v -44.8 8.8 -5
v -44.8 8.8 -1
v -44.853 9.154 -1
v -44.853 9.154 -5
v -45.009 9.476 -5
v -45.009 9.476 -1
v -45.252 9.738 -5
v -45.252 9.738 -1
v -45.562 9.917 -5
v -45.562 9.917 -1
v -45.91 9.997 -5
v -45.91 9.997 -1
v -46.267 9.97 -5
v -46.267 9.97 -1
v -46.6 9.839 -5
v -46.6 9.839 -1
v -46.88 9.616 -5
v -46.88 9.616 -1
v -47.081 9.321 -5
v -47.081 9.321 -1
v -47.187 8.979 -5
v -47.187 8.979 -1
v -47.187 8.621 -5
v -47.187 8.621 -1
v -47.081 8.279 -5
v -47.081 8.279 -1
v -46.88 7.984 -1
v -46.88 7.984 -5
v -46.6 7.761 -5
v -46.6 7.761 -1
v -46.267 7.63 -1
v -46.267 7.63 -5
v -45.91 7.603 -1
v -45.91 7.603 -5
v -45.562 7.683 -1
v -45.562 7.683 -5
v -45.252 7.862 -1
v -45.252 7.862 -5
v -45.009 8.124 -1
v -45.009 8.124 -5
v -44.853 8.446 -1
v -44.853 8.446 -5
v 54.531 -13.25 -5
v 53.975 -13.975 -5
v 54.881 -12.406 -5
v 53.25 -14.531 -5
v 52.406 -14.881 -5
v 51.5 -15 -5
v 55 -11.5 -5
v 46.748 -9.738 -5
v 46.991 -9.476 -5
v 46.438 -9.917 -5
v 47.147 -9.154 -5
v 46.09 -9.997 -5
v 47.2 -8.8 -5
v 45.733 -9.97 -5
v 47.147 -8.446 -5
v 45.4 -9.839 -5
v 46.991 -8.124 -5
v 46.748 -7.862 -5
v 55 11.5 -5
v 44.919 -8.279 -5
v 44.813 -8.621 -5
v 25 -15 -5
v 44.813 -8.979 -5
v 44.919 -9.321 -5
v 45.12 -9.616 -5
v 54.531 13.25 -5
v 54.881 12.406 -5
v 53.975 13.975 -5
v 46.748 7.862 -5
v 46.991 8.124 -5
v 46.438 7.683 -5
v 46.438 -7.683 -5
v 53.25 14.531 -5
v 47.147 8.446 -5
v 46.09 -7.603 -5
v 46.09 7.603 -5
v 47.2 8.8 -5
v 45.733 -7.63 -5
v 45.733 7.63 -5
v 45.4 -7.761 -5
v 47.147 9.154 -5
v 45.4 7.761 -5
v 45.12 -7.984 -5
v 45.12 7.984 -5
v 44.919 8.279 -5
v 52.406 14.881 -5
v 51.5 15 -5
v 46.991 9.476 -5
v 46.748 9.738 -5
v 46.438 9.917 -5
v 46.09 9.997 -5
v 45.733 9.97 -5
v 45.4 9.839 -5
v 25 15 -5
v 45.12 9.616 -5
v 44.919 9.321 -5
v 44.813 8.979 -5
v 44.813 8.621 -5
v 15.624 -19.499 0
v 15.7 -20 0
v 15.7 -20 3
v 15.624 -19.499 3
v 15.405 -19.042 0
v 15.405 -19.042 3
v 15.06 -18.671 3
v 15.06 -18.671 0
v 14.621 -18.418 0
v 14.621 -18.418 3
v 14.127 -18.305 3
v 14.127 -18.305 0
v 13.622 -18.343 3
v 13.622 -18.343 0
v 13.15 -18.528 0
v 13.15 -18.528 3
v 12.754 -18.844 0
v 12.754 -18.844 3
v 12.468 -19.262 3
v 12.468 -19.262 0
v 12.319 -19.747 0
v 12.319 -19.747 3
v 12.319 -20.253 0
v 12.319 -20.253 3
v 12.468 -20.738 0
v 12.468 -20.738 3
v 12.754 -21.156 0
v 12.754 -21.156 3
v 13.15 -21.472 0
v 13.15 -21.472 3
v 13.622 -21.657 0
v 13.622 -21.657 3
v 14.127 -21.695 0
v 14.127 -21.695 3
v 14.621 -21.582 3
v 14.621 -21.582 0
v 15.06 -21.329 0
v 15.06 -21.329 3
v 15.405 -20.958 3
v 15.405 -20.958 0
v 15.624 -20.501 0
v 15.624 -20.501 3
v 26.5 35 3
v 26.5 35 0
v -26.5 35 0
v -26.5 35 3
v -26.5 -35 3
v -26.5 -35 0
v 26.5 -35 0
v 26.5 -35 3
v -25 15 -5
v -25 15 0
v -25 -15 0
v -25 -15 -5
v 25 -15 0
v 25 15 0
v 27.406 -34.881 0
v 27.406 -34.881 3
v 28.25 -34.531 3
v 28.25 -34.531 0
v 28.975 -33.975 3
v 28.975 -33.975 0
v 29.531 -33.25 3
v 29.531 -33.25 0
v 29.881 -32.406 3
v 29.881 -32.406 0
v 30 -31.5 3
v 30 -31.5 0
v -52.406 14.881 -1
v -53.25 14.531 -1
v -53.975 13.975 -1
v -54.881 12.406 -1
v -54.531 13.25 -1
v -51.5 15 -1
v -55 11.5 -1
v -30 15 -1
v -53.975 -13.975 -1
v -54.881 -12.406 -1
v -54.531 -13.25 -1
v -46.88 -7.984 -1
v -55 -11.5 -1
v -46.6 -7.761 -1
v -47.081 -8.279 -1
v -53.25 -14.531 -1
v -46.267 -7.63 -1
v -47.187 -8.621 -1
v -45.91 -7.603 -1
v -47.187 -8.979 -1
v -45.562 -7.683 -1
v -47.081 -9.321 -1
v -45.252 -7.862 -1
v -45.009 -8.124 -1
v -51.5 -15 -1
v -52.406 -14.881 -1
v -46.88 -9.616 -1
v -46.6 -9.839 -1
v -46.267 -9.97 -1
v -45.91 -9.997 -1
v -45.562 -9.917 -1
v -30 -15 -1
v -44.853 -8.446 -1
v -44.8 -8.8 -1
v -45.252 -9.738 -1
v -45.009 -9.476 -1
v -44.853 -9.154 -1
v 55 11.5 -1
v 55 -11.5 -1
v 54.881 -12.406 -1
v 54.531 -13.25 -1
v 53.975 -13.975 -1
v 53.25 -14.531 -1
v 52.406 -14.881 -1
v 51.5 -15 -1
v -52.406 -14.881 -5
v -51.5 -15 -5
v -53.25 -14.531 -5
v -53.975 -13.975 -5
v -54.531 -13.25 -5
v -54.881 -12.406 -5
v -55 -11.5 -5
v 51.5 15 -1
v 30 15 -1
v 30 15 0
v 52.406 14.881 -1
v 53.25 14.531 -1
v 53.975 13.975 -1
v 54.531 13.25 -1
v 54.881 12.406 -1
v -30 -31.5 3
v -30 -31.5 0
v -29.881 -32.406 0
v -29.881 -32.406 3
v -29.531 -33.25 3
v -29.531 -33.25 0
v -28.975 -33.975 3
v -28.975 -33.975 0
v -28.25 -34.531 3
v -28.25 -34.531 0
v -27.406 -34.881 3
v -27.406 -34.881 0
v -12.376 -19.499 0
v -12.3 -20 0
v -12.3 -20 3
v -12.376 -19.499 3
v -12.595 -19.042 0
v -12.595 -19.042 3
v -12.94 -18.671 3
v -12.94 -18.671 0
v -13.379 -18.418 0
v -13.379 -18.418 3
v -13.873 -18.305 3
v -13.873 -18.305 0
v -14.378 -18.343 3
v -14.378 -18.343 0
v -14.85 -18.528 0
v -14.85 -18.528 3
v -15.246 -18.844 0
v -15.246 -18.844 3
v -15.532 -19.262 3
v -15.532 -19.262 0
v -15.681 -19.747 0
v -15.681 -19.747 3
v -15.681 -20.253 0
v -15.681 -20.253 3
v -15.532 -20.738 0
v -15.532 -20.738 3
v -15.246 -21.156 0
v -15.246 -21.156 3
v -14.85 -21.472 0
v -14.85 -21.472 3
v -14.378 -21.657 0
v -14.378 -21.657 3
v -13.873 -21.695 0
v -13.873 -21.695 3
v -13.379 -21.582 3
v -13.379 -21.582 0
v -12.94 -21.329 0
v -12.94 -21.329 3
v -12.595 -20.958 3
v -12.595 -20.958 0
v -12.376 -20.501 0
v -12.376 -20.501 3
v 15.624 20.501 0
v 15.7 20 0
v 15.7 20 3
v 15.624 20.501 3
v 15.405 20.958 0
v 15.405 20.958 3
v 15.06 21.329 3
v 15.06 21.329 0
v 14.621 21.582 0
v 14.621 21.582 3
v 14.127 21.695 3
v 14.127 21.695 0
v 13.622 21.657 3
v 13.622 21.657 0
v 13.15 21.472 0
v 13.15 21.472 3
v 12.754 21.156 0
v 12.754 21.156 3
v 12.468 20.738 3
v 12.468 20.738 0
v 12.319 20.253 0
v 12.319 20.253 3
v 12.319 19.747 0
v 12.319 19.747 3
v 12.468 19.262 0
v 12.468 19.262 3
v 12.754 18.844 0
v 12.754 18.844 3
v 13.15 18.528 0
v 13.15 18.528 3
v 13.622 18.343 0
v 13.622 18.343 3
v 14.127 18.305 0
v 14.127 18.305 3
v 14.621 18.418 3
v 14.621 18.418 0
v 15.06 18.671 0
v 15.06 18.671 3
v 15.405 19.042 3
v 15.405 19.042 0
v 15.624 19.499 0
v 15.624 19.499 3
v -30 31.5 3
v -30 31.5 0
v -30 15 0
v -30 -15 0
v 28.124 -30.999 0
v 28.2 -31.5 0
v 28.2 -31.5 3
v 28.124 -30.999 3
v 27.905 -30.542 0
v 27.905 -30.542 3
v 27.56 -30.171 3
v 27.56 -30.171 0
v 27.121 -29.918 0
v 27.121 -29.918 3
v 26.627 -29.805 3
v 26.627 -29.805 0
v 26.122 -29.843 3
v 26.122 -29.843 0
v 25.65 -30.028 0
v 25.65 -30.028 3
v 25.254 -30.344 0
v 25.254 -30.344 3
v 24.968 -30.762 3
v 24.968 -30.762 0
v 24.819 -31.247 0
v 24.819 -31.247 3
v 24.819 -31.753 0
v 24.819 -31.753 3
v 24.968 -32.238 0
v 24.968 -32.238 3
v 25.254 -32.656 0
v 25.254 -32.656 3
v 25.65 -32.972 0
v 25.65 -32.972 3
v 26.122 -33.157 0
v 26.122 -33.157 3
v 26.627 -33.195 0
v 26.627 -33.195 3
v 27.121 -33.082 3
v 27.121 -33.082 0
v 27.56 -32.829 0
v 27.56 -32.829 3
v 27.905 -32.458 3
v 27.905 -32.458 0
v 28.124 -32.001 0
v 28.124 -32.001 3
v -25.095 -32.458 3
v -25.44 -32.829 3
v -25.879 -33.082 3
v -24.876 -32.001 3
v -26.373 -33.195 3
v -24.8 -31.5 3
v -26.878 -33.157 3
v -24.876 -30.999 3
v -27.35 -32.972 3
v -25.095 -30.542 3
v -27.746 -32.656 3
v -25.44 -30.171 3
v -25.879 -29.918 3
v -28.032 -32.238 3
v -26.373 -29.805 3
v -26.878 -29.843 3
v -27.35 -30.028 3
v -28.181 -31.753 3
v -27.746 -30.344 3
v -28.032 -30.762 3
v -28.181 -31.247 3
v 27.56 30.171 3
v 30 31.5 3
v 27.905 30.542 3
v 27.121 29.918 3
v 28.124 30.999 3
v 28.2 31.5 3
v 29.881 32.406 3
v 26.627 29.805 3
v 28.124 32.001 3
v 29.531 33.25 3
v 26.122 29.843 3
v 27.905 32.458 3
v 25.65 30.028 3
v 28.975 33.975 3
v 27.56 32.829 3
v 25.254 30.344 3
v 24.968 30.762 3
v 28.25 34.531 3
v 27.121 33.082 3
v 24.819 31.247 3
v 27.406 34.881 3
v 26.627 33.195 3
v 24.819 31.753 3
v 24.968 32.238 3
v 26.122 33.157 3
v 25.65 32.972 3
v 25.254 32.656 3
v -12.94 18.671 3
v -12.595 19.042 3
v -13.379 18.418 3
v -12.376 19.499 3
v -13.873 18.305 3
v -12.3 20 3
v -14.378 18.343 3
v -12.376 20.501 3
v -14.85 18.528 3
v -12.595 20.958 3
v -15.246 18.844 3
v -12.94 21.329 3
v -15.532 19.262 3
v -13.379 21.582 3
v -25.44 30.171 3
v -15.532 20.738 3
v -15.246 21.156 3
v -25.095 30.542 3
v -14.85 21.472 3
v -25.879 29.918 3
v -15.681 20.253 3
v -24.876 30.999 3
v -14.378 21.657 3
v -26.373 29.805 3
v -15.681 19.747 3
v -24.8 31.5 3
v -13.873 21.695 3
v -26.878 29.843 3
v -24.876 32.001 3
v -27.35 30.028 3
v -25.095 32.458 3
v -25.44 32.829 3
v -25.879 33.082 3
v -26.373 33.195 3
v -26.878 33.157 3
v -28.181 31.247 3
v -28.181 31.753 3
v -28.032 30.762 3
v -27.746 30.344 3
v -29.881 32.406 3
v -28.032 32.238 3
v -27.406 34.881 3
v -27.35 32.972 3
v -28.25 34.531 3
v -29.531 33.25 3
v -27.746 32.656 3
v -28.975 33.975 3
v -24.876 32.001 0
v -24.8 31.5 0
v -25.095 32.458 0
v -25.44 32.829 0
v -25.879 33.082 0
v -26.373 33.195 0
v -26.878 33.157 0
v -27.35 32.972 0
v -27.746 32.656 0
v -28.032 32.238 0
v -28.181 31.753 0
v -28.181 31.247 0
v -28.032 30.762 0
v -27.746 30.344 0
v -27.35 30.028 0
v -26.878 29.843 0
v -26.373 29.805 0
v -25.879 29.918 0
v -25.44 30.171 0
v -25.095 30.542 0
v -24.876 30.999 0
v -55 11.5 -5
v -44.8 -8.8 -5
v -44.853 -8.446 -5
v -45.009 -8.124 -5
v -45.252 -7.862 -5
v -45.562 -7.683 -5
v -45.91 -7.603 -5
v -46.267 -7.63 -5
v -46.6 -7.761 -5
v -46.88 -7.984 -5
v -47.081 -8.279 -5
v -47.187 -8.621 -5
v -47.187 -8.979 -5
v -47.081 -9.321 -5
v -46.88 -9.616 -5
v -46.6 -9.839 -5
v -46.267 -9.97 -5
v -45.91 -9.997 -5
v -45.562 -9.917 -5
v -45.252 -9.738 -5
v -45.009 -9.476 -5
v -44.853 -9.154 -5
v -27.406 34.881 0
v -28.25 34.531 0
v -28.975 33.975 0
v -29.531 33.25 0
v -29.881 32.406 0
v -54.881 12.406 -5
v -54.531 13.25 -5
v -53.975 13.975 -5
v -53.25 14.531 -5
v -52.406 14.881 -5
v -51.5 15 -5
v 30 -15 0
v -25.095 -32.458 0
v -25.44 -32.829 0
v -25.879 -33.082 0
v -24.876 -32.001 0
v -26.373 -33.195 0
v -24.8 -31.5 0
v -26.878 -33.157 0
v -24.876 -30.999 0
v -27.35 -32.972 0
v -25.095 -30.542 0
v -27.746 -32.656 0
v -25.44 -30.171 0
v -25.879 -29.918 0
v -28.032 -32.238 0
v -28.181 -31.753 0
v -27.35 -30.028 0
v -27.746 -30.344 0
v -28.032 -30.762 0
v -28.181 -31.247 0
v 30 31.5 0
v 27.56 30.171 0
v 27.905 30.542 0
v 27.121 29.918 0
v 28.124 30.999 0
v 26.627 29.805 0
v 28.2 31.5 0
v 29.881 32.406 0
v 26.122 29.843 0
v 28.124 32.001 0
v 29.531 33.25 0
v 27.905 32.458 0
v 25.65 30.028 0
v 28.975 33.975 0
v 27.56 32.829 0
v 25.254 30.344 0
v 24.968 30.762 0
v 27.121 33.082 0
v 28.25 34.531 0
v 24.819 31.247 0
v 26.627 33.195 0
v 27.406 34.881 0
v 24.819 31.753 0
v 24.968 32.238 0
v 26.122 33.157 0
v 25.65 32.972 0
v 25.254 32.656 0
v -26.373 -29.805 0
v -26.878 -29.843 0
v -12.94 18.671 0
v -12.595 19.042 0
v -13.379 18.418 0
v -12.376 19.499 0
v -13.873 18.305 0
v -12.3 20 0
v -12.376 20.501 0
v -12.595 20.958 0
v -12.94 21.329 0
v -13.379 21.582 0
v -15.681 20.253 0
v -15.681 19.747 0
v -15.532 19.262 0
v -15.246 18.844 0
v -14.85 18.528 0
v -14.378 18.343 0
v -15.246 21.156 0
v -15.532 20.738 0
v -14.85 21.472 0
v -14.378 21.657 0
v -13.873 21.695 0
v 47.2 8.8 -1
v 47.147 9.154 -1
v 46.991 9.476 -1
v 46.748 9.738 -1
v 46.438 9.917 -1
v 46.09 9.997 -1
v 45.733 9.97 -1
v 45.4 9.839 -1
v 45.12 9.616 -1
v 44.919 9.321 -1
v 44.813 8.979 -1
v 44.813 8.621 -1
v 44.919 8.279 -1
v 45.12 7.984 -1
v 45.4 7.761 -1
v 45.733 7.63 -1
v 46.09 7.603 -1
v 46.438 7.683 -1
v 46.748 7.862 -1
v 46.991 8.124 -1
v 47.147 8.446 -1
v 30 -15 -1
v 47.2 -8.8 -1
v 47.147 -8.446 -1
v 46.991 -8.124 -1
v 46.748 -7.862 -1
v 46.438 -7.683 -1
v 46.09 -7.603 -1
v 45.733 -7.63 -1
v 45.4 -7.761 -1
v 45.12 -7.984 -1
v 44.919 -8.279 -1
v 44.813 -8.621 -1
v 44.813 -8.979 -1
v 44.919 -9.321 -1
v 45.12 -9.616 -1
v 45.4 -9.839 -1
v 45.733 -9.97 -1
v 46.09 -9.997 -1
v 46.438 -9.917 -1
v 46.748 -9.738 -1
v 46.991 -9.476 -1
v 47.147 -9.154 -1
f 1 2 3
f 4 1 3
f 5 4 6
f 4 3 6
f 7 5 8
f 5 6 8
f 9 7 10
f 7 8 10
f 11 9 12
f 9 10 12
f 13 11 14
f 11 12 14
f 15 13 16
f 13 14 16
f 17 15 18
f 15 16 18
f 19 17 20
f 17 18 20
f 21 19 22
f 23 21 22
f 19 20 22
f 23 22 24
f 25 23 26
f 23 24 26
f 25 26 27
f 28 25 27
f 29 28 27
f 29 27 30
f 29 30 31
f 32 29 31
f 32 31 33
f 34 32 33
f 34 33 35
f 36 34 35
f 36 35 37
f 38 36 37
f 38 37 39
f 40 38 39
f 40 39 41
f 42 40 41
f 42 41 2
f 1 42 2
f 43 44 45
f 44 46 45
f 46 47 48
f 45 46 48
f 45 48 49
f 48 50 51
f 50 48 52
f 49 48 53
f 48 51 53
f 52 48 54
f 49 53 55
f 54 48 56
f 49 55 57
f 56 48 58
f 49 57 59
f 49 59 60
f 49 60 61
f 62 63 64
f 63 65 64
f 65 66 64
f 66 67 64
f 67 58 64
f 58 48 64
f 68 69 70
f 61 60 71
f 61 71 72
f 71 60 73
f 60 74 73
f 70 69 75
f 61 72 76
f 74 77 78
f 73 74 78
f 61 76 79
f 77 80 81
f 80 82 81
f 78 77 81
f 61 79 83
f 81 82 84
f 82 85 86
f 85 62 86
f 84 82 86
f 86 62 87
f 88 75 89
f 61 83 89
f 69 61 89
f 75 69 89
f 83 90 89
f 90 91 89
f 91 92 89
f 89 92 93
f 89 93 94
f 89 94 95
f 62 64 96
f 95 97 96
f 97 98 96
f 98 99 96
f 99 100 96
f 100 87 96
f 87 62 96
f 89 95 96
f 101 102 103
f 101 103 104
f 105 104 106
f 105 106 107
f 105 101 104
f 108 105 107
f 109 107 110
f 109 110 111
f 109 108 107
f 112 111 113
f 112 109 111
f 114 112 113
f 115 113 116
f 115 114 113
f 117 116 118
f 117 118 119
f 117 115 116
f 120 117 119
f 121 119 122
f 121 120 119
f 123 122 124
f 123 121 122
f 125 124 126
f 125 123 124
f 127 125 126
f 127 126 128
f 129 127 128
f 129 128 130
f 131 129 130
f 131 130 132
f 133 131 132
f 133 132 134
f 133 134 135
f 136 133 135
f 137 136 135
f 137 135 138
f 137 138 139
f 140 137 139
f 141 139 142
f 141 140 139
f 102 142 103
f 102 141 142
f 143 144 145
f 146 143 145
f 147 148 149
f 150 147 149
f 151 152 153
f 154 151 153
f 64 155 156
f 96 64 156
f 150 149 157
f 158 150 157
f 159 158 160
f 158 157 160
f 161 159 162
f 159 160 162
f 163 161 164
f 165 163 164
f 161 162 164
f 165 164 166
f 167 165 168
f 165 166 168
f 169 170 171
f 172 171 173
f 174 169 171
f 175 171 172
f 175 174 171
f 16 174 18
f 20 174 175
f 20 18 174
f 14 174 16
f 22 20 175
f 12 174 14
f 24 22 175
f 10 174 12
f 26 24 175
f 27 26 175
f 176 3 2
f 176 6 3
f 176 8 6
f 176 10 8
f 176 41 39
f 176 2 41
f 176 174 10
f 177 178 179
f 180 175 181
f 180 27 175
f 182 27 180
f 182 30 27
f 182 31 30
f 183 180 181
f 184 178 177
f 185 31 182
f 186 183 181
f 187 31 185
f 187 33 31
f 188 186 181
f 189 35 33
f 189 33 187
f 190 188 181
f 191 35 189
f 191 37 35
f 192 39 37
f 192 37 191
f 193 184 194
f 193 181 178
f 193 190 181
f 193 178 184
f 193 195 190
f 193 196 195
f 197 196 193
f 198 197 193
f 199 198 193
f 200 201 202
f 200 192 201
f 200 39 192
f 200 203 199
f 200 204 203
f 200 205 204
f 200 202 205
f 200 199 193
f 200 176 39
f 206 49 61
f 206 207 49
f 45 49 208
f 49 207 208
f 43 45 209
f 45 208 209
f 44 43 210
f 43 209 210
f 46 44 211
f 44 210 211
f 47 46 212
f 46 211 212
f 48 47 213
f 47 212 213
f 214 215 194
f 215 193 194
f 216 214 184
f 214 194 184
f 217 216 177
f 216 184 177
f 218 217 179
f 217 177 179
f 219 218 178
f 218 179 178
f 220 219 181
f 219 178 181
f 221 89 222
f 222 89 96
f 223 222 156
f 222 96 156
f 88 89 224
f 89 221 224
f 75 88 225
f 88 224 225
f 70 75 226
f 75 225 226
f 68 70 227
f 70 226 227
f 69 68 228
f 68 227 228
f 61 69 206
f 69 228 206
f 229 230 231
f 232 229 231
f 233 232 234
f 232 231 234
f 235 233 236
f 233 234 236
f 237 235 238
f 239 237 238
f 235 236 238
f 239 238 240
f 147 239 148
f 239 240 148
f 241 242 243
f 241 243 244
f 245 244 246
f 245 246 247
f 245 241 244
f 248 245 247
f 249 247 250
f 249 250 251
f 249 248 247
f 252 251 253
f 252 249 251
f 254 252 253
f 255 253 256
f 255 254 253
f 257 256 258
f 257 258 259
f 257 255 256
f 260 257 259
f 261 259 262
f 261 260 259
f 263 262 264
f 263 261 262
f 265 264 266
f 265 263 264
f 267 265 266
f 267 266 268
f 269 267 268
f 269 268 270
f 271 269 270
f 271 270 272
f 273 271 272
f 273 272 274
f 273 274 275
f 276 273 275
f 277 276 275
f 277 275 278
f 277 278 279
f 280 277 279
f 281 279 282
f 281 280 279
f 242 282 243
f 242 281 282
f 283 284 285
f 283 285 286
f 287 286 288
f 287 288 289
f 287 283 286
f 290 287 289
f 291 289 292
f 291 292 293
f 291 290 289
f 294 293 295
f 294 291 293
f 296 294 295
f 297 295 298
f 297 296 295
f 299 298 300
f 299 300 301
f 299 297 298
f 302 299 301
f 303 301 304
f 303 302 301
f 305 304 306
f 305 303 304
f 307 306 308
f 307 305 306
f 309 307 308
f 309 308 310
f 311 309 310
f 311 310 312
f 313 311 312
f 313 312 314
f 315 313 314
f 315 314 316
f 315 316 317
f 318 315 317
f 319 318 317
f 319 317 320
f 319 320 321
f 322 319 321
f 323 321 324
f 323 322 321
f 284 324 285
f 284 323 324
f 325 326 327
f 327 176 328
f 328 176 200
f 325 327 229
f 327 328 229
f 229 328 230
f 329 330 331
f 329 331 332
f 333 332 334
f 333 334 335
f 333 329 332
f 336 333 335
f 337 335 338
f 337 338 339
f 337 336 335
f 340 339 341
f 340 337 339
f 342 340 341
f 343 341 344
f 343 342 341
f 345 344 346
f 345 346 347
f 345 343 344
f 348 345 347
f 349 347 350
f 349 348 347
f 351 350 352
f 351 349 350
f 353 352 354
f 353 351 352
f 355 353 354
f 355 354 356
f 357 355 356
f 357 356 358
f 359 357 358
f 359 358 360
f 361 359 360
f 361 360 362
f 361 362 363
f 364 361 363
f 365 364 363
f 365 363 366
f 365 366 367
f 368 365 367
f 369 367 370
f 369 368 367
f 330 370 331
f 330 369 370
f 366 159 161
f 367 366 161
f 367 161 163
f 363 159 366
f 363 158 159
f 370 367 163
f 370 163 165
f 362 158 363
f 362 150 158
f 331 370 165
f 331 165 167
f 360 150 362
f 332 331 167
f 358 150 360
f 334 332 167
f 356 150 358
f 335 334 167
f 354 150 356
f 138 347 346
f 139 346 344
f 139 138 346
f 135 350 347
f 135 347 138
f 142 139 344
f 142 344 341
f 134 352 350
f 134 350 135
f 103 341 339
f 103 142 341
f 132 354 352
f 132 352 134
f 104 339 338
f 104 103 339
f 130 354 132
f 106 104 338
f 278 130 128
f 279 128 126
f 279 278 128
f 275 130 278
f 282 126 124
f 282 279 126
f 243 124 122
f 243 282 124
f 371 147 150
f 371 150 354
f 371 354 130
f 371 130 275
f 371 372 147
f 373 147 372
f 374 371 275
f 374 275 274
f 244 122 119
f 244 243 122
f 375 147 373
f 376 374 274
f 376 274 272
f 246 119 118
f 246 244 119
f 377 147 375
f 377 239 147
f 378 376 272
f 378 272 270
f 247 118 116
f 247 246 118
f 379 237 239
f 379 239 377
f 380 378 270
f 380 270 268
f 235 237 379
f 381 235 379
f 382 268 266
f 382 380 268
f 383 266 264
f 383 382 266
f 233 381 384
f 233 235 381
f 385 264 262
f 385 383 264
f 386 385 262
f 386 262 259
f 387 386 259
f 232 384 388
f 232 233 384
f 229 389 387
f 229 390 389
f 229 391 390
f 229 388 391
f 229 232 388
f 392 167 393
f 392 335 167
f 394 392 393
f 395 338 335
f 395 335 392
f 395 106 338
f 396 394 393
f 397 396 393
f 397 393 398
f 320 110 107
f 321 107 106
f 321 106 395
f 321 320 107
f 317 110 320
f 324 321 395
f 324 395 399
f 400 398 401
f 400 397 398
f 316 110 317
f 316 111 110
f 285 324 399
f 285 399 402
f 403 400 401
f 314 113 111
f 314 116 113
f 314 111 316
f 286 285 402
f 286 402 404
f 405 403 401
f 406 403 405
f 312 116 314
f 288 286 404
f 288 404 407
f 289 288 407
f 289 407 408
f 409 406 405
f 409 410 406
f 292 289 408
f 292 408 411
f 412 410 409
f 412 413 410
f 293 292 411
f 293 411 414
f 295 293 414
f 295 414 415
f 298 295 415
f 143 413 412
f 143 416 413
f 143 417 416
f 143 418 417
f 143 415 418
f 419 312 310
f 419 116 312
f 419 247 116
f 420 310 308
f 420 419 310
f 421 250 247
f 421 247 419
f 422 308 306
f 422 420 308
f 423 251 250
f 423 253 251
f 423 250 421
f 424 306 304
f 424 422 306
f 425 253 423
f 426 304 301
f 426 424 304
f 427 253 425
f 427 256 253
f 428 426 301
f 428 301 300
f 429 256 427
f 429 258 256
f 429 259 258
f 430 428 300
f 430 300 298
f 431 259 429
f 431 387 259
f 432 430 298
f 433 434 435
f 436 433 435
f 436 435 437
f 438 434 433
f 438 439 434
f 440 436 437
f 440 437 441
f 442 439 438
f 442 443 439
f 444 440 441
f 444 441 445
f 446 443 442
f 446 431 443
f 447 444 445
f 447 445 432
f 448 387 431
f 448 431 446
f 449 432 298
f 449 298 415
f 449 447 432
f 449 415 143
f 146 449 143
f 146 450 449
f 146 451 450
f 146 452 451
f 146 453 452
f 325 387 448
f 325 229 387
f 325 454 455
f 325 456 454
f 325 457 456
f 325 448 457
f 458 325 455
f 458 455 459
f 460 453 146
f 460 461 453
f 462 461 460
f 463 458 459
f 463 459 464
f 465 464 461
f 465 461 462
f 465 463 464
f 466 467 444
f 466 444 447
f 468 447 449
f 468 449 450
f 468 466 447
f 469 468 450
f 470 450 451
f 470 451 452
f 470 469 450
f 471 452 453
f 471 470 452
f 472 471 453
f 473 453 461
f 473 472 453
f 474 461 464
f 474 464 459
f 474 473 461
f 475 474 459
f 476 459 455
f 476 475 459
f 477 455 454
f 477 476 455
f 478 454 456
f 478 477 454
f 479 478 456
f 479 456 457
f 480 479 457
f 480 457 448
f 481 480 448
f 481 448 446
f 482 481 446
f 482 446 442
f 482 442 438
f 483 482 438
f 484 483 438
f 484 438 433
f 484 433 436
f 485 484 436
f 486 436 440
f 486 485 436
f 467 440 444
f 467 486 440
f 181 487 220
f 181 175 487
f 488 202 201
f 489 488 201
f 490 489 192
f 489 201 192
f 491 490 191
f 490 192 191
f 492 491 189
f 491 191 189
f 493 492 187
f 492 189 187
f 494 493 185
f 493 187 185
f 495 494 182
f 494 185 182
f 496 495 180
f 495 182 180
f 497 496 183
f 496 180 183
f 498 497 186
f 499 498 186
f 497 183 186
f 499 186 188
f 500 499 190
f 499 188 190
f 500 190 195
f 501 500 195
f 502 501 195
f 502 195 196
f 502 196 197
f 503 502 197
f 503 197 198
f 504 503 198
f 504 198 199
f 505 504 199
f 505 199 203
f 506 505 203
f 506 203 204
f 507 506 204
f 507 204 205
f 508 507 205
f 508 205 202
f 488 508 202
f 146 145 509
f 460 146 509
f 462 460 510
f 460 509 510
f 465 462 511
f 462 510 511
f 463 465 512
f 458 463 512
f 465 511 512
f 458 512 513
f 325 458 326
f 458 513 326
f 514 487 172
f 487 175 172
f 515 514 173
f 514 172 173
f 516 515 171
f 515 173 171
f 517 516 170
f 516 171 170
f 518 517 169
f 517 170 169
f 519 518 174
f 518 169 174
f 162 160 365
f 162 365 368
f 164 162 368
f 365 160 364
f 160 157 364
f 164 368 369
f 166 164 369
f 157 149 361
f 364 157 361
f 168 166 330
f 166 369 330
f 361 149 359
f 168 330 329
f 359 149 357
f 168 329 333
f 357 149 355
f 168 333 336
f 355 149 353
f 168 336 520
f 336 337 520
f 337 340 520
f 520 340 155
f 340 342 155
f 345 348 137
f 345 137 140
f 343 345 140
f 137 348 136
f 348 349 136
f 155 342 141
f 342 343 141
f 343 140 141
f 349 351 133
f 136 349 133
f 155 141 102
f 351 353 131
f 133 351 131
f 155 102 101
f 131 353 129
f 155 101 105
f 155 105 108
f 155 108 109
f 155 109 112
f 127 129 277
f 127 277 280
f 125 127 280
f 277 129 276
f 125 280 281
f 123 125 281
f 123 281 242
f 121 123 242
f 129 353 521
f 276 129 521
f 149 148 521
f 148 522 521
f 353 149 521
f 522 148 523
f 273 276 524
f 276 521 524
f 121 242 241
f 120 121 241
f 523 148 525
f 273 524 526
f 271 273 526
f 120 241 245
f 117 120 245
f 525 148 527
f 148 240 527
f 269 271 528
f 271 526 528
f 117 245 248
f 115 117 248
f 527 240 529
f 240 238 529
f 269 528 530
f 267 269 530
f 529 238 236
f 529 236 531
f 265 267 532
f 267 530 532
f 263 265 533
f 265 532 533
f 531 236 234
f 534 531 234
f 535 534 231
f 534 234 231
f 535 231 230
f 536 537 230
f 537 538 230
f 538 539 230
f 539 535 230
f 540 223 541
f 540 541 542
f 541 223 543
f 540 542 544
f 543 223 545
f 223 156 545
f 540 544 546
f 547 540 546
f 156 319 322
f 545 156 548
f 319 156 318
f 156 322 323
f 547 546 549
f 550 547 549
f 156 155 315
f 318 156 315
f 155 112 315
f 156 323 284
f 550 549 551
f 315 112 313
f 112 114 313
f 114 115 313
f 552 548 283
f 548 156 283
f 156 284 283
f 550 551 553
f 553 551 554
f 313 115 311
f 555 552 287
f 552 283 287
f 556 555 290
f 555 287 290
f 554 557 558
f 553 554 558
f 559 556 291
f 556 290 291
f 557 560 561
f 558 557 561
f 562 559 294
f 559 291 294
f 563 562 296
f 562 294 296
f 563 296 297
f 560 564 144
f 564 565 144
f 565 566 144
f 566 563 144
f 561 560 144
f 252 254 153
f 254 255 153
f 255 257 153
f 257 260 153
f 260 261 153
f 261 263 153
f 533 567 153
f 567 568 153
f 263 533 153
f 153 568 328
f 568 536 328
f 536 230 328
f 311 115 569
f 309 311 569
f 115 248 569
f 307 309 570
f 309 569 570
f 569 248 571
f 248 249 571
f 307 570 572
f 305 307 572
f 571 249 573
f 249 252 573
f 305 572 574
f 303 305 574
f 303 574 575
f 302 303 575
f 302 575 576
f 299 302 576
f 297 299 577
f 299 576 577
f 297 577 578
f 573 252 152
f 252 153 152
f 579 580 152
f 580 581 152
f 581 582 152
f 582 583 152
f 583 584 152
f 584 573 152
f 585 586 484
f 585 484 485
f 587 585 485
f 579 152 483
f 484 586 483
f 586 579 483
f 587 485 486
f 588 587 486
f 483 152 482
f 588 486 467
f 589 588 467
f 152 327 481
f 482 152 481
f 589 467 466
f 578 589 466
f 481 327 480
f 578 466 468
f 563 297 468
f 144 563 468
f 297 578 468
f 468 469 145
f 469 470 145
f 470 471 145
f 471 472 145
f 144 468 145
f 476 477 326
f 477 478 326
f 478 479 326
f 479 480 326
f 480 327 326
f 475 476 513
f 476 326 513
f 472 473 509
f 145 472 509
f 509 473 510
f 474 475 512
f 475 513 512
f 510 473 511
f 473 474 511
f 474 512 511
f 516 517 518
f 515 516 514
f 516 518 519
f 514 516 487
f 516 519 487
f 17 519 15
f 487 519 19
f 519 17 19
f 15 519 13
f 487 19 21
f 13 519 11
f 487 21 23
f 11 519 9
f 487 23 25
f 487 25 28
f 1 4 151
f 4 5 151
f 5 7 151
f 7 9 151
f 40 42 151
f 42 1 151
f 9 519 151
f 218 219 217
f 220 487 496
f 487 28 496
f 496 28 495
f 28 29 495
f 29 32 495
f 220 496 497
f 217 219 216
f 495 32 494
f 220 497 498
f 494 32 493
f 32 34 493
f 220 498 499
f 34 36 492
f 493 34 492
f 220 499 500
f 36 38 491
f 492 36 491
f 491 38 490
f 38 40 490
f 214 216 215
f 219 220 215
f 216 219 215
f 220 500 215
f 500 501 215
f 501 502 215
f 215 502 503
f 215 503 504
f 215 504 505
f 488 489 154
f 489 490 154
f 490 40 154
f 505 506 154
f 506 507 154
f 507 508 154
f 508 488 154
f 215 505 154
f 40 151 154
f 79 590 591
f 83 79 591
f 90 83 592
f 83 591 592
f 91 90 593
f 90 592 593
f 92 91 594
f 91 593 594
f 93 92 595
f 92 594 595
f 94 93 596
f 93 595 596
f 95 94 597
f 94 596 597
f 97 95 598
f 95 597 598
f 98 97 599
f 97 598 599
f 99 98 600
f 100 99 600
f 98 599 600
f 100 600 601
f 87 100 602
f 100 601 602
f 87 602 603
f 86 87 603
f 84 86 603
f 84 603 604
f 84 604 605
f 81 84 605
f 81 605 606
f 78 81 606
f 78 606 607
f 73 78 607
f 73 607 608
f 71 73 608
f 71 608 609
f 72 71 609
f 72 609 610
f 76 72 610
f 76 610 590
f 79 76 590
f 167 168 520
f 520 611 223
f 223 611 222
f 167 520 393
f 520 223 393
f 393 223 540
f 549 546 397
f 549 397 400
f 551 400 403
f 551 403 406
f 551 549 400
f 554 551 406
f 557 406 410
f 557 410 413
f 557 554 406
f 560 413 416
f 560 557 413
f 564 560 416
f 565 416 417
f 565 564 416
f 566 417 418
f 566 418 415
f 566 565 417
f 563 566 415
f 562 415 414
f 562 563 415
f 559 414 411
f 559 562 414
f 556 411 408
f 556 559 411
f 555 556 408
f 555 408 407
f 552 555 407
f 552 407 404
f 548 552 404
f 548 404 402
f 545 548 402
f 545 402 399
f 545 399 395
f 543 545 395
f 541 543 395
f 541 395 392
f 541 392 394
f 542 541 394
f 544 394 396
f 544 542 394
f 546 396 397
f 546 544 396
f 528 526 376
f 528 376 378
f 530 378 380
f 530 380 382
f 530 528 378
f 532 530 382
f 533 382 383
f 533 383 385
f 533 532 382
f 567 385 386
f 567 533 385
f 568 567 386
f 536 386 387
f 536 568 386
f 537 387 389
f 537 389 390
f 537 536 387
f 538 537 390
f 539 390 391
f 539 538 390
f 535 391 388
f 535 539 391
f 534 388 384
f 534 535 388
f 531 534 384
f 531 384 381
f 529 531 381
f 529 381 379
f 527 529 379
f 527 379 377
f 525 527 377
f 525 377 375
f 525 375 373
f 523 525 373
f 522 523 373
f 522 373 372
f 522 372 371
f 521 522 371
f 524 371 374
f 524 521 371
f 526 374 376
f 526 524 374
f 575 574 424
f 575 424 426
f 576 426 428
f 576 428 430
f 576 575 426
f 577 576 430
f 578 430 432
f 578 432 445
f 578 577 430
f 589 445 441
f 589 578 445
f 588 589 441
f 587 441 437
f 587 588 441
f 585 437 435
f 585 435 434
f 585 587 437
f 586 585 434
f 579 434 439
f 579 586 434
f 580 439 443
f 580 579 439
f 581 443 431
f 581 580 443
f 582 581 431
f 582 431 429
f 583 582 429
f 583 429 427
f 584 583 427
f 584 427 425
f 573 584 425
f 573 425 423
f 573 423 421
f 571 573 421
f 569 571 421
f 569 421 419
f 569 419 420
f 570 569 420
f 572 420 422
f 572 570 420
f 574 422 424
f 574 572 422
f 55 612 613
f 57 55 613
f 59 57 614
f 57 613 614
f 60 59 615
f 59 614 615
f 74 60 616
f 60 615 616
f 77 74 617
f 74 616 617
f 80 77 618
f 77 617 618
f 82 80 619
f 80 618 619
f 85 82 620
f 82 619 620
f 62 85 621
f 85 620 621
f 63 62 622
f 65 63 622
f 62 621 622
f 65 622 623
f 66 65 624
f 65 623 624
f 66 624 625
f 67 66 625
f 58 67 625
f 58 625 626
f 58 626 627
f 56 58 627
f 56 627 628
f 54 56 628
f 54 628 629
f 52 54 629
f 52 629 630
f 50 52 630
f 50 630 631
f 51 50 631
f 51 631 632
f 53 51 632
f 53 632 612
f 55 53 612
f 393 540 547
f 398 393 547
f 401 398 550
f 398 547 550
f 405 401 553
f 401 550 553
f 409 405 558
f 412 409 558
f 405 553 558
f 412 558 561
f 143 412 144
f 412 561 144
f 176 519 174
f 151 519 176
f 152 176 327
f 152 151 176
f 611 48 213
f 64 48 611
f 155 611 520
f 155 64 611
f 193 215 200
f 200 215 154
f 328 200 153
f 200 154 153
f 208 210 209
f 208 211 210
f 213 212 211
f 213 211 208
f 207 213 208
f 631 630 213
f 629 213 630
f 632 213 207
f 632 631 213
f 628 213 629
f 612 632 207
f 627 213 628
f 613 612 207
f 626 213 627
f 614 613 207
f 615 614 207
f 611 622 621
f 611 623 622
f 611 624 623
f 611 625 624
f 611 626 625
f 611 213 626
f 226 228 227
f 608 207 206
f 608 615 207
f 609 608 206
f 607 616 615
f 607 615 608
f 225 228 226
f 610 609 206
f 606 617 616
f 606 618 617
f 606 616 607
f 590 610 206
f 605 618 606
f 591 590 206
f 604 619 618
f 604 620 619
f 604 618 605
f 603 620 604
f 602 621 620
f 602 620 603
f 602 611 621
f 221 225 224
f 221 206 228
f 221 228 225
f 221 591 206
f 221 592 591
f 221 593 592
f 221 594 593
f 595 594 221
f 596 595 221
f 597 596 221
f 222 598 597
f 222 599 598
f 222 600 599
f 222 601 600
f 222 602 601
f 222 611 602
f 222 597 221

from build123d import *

# Parameters (mm, degrees)
SKETCH2_R           = 1.7
BOSS_EXTRUDE2_DEPTH = 3
SKETCH3_W           = 30
SKETCH3_H           = 5
BOSS_EXTRUDE3_DEPTH = 5
SKETCH4_W           = 30
SKETCH4_H           = 5
BOSS_EXTRUDE4_DEPTH = 5
SKETCH5_W           = 30
SKETCH5_H           = 4
BOSS_EXTRUDE5_DEPTH = 25
SKETCH6_W           = 30
SKETCH6_H           = 4
BOSS_EXTRUDE8_DEPTH = 25
SKETCH8_R           = 1.2
CUT_EXTRUDE1_DEPTH  = 25
FILLET5_R           = 3.5
FILLET6_R           = 3.5
FILLET7_R           = 3.5
FILLET8_R           = 3.5


with BuildPart() as part:
    # Sketch2 → Boss-Extrude2 (new body)
    with BuildSketch(Plane(origin=(0, 0, 0), x_dir=(0, 1, 0), z_dir=(0, 0, 1))):
        with BuildLine():
            Line((-31.5, -30), (31.5, -30))
            ThreePointArc((31.5, -30), (33.974873734, -28.974873734), (35, -26.5))
            Line((35, -26.5), (35, 26.5))
            ThreePointArc((35, 26.5), (33.974873734, 28.974873734), (31.5, 30))
            Line((31.5, 30), (-31.5, 30))
            ThreePointArc((-31.5, 30), (-33.974873734, 28.974873734), (-35, 26.5))
            Line((-35, 26.5), (-35, -26.5))
            ThreePointArc((-35, -26.5), (-33.974873734, -28.974873734), (-31.5, -30))
        make_face()
        with Locations(Location((20, -14, 0), (0, 0, 270))):
            Circle(SKETCH2_R, mode=Mode.SUBTRACT)
        with Locations(Location((-20, -14, 0), (0, 0, 270))):
            Circle(SKETCH2_R, mode=Mode.SUBTRACT)
        with Locations(Location((20, 14, 0), (0, 0, 270))):
            Circle(SKETCH2_R, mode=Mode.SUBTRACT)
        with Locations(Location((-20, 14, 0), (0, 0, 270))):
            Circle(SKETCH2_R, mode=Mode.SUBTRACT)
        with Locations(Location((31.5, -26.5, 0), (0, 0, 270))):
            Circle(SKETCH2_R, mode=Mode.SUBTRACT)
        with Locations(Location((-31.5, -26.5, 0), (0, 0, 270))):
            Circle(SKETCH2_R, mode=Mode.SUBTRACT)
        with Locations(Location((31.5, 26.5, 0), (0, 0, 270))):
            Circle(SKETCH2_R, mode=Mode.SUBTRACT)
        with Locations(Location((-31.5, 26.5, 0), (0, 0, 270))):
            Circle(SKETCH2_R, mode=Mode.SUBTRACT)
    extrude(amount=BOSS_EXTRUDE2_DEPTH)

    # Sketch3 → Boss-Extrude3 (add)
    with BuildSketch(Plane.YZ.offset(30)):
        with Locations((0, -2.5)):
            Rectangle(SKETCH3_W, SKETCH3_H)
    extrude(amount=-BOSS_EXTRUDE3_DEPTH)

    # Sketch4 → Boss-Extrude4 (add)
    with BuildSketch(Plane(origin=(-30, 0, 0), x_dir=(0, -1, 0), z_dir=(-1, 0, 0))):
        with Locations((0, -2.5)):
            Rectangle(SKETCH4_W, SKETCH4_H)
    extrude(amount=-BOSS_EXTRUDE4_DEPTH)

    # Sketch5 → Boss-Extrude5 (add)
    with BuildSketch(Plane(origin=(-30, 0, 0), x_dir=(0, -1, 0), z_dir=(-1, 0, 0))):
        with Locations((0, -3)):
            Rectangle(SKETCH5_W, SKETCH5_H)
    extrude(amount=BOSS_EXTRUDE5_DEPTH)

    # Sketch6 → Boss-Extrude8 (add)
    with BuildSketch(Plane.YZ.offset(30)):
        with Locations((0, -3)):
            Rectangle(SKETCH6_W, SKETCH6_H)
    extrude(amount=BOSS_EXTRUDE8_DEPTH)

    # Sketch8 → Cut-Extrude1 (cut)
    with BuildSketch(Plane(origin=(0, 0, -1), x_dir=(0, -1, 0), z_dir=(0, 0, 1))):
        with Locations(Location((-8.8, -46, 0), (0, 0, 90))):
            Circle(SKETCH8_R)
        with Locations(Location((8.8, -46, 0), (0, 0, 90))):
            Circle(SKETCH8_R)
        with Locations(Location((-8.8, 46, 0), (0, 0, 90))):
            Circle(SKETCH8_R)
        with Locations(Location((8.8, 46, 0), (0, 0, 90))):
            Circle(SKETCH8_R)
    extrude(amount=-CUT_EXTRUDE1_DEPTH, mode=Mode.SUBTRACT)

    # Fillet5
    fillet5_edges = [part.edges().sort_by_distance(p)[0] for p in [
        (-55, -15, -3),
    ]]
    fillet(fillet5_edges, radius=FILLET5_R)

    # Fillet6
    fillet6_edges = [part.edges().sort_by_distance(p)[0] for p in [
        (-55, 15, -3),
    ]]
    fillet(fillet6_edges, radius=FILLET6_R)

    # Fillet7
    fillet7_edges = [part.edges().sort_by_distance(p)[0] for p in [
        (55, 15, -3),
    ]]
    fillet(fillet7_edges, radius=FILLET7_R)

    # Fillet8
    fillet8_edges = [part.edges().sort_by_distance(p)[0] for p in [
        (55, -15, -3),
    ]]
    fillet(fillet8_edges, radius=FILLET8_R)


solid = part.part
